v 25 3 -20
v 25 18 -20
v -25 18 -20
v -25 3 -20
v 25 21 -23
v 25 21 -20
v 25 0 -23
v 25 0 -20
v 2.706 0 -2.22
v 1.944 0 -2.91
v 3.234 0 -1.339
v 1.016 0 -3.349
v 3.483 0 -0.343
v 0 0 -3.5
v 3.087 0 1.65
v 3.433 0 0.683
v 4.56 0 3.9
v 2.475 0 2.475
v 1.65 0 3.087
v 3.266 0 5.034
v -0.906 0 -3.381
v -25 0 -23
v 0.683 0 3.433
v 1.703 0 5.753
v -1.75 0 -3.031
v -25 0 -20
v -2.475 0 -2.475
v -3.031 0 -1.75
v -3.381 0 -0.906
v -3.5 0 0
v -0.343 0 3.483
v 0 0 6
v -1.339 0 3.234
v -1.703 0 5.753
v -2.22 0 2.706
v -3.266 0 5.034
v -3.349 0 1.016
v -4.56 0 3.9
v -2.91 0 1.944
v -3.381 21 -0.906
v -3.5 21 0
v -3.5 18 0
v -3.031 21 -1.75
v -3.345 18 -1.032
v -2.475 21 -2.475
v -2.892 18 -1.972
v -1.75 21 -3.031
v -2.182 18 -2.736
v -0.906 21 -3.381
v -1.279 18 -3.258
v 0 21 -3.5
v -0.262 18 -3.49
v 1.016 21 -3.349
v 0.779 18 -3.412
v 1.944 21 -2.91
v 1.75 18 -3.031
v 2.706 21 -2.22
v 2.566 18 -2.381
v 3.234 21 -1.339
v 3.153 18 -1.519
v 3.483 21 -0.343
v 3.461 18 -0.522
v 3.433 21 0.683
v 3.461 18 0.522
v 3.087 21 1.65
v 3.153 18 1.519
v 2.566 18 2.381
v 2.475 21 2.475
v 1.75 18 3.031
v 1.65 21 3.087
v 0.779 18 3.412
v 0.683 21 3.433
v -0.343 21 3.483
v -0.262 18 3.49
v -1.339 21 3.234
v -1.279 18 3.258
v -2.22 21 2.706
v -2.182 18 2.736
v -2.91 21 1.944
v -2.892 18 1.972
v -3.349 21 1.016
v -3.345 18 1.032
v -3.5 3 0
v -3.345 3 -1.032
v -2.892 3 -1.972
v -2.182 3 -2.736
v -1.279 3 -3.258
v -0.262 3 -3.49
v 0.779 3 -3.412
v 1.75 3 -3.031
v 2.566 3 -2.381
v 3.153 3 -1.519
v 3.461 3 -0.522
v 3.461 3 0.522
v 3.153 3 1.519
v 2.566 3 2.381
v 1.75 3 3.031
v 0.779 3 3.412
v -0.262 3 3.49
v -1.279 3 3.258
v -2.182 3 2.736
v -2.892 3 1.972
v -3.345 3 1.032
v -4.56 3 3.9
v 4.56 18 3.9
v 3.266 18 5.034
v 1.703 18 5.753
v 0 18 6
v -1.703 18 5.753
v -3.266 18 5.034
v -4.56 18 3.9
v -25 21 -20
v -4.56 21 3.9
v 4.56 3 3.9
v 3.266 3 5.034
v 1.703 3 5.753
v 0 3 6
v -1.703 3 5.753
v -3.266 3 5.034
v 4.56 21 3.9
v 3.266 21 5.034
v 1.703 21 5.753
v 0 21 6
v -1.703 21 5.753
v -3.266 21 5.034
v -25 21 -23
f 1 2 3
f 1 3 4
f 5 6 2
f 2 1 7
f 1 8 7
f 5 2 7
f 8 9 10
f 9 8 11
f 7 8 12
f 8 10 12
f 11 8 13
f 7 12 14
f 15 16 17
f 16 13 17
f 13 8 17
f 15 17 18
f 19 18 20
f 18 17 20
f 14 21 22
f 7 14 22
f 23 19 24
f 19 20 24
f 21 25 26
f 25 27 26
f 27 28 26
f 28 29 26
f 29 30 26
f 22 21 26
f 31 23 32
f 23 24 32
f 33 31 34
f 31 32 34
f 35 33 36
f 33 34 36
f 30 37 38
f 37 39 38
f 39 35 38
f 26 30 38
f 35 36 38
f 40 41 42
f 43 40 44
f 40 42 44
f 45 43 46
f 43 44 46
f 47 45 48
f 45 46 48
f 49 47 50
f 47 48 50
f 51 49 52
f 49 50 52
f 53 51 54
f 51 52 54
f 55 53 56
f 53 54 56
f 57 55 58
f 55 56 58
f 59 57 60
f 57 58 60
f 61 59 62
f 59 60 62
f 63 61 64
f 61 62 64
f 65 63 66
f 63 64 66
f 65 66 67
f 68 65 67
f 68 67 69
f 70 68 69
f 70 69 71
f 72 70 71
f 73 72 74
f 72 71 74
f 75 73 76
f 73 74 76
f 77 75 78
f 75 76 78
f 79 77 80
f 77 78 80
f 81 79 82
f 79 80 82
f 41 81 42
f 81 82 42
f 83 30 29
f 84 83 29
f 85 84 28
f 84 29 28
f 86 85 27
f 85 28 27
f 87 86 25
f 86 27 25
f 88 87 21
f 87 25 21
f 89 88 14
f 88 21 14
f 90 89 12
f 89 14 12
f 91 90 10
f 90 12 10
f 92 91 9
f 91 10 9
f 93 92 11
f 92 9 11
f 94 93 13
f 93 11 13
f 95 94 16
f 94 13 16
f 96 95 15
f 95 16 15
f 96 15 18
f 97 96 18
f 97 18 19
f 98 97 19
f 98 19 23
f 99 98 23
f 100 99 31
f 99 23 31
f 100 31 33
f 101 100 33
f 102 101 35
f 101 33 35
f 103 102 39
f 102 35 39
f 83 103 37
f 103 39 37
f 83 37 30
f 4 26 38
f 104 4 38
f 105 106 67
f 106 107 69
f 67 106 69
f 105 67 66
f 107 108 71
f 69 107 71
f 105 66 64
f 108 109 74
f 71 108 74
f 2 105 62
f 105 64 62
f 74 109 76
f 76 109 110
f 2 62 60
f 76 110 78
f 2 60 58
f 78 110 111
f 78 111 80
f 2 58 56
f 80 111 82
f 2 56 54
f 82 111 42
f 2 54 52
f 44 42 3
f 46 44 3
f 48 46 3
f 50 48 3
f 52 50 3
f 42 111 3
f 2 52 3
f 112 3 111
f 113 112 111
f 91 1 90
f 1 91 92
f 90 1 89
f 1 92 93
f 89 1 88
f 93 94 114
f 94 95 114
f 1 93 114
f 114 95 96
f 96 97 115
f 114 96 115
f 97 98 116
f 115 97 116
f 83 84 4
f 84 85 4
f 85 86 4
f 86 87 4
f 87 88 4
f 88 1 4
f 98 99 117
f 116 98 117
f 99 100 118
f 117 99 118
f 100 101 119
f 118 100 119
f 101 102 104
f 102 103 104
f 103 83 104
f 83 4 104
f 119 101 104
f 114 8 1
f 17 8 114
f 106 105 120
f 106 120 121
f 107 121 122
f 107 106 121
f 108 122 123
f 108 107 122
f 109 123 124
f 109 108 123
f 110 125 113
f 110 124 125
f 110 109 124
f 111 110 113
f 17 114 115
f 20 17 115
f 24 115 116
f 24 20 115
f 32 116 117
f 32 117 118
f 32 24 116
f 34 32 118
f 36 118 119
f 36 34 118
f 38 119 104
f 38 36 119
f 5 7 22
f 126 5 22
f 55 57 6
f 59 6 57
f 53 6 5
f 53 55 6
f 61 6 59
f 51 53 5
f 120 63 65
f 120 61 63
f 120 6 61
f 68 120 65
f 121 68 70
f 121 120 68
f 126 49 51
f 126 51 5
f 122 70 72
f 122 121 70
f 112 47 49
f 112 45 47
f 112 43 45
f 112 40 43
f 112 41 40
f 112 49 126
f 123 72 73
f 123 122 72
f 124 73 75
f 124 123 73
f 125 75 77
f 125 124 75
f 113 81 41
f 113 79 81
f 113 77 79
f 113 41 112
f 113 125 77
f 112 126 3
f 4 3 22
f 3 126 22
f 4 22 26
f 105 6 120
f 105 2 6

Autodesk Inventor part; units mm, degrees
ref_plane "YZ Plane" through (0, 0, 0) normal (1, 0, 0) x (0, 1, 0)
ref_plane "XZ Plane" through (0, 0, 0) normal (0, 1, 0) x (-1, 0, 0)
ref_plane "XY Plane" through (0, 0, 0) normal (0, 0, 1) x (1, 0, 0)
sketch "Sketch1" plane through (0, 0, 0) normal (0, 1, 0) x (-1, 0, 0)
  circle A0 centre (0, 0) radius 3.5
  circle A1 centre (0, 0) radius 6
  line L0 (0, 0) -> (0, -20)
  line L1 (25, -20) -> (-25, -20)
  line L2 (25, -20) -> (4.5598, 3.8998)
  line L3 (-25, -20) -> (-4.5598, 3.8998)
  line L4 (25, -20) -> (-25, -20)
  line L5 (-25, -20) -> (-25, -23)
  line L6 (-25, -23) -> (25, -23)
  line L7 (25, -23) -> (25, -20)
  point P0 (-25, -20)
  dimension "d0" = 7
  dimension "d1" = 12
  dimension "d2" = 20
  dimension "d3" = 50
  dimension "d4" = 3
extrude "Extrusion1" add sketch "Sketch1" along normal blind 21
sketch "Sketch2" plane through (0, 0, 0) normal (1, 0, 0) x (0, 1, 0)
  line L0 (18, -20) -> (3, -20)
  line L1 (3, -20) -> (3, 27.9628)
  line L2 (3, 27.9628) -> (18, 27.9628)
  line L3 (18, 27.9628) -> (18, -20)
  line L4 (0, -20) -> (21, -20) projected
  point P0 (0, 0)
  point P1 (10.5, -20)
  dimension "d7" = 15
extrude "Extrusion2" cut sketch "Sketch2" along normal mid plane 100
properties part number "ShifterBracket"
